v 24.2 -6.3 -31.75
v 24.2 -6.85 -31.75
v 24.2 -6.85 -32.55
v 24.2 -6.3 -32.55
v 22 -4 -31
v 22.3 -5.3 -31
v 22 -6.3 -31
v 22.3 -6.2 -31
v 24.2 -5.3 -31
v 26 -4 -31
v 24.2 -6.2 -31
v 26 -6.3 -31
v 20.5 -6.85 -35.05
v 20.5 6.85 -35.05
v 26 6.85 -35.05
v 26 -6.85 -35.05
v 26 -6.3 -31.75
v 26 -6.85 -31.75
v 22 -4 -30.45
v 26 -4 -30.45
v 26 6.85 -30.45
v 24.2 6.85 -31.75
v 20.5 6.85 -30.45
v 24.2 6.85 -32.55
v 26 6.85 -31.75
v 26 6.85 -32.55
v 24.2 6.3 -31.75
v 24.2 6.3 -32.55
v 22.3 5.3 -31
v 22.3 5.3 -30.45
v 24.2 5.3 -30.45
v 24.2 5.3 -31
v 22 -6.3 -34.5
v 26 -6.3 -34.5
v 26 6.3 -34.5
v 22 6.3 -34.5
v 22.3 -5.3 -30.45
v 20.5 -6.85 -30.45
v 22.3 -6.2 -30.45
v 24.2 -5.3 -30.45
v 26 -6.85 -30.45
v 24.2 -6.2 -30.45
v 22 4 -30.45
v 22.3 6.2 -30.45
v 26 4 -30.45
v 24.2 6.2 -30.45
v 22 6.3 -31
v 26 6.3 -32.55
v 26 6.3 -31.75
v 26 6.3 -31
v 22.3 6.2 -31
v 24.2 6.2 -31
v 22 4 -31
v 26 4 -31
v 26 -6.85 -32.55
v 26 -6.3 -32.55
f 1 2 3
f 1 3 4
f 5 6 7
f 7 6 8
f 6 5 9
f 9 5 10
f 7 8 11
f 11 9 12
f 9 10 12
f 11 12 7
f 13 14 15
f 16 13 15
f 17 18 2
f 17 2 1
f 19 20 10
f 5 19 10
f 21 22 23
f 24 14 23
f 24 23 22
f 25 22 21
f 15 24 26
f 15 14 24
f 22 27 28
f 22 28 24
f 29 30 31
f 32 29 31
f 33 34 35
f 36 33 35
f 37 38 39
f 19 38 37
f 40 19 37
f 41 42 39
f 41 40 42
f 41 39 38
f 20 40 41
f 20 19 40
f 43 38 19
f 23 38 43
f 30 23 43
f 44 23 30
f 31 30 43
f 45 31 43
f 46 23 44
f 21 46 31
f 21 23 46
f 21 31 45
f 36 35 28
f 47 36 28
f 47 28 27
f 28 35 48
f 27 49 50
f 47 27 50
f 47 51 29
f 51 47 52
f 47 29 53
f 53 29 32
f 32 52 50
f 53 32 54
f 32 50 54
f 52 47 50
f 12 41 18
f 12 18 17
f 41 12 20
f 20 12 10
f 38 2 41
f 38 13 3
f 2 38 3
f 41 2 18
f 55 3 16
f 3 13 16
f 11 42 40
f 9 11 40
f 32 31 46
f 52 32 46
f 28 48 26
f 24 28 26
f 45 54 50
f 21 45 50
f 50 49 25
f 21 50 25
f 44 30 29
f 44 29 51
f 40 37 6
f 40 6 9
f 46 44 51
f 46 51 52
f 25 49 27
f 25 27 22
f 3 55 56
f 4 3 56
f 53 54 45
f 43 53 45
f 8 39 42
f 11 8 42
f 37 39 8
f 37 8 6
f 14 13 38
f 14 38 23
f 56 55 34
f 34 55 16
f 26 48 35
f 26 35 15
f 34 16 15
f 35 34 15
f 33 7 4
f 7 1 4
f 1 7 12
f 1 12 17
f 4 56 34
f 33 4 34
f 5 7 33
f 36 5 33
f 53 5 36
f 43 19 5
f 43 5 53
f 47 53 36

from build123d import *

# Parameters (mm, degrees)
SKETCH016_W     = 5.5
SKETCH016_H     = 13.7
PAD006_DEPTH    = 4.6
POCKET007_DEPTH = 4
SKETCH018_W     = 13.7
SKETCH018_H     = 0.8
POCKET008_DEPTH = 1.8
SKETCH019_W     = 1.9
SKETCH019_H     = 0.9
POCKET009_DEPTH = 1


with BuildPart() as part:
    # Sketch016 → Pad006 (new body)
    with BuildSketch(Plane.XY):
        with Locations((-2.75, 0)):
            Rectangle(SKETCH016_W, SKETCH016_H)
    extrude(amount=PAD006_DEPTH)

    # Sketch017 → Pocket007 (cut)
    with BuildSketch(Plane.YZ):
        Polygon((-4, 4.6), (-4, 4.05), (-6.3, 4.05), (-6.3, 0.55), (6.3, 0.55), (6.3, 4.05), (4, 4.05), (4, 4.6), align=None)
    extrude(amount=-POCKET007_DEPTH, mode=Mode.SUBTRACT)

    # Sketch018 → Pocket008 (cut)
    with BuildSketch(Plane.YZ):
        with Locations((0, 2.9)):
            Rectangle(SKETCH018_W, SKETCH018_H)
    extrude(amount=-POCKET008_DEPTH, mode=Mode.SUBTRACT)

    # Sketch019 → Pocket009 (cut)
    with BuildSketch(Plane.XY.offset(4.6)):
        with Locations((-2.75, 5.75)):
            Rectangle(SKETCH019_W, SKETCH019_H)
        with Locations((-2.75, -5.75)):
            Rectangle(SKETCH019_W, SKETCH019_H)
    extrude(amount=-POCKET009_DEPTH, mode=Mode.SUBTRACT)


with BuildPart() as part_1:
    # Body008 placement: moved
    add(part.part.moved(Location((26, 0, -35.05))))


solid = part_1.part
